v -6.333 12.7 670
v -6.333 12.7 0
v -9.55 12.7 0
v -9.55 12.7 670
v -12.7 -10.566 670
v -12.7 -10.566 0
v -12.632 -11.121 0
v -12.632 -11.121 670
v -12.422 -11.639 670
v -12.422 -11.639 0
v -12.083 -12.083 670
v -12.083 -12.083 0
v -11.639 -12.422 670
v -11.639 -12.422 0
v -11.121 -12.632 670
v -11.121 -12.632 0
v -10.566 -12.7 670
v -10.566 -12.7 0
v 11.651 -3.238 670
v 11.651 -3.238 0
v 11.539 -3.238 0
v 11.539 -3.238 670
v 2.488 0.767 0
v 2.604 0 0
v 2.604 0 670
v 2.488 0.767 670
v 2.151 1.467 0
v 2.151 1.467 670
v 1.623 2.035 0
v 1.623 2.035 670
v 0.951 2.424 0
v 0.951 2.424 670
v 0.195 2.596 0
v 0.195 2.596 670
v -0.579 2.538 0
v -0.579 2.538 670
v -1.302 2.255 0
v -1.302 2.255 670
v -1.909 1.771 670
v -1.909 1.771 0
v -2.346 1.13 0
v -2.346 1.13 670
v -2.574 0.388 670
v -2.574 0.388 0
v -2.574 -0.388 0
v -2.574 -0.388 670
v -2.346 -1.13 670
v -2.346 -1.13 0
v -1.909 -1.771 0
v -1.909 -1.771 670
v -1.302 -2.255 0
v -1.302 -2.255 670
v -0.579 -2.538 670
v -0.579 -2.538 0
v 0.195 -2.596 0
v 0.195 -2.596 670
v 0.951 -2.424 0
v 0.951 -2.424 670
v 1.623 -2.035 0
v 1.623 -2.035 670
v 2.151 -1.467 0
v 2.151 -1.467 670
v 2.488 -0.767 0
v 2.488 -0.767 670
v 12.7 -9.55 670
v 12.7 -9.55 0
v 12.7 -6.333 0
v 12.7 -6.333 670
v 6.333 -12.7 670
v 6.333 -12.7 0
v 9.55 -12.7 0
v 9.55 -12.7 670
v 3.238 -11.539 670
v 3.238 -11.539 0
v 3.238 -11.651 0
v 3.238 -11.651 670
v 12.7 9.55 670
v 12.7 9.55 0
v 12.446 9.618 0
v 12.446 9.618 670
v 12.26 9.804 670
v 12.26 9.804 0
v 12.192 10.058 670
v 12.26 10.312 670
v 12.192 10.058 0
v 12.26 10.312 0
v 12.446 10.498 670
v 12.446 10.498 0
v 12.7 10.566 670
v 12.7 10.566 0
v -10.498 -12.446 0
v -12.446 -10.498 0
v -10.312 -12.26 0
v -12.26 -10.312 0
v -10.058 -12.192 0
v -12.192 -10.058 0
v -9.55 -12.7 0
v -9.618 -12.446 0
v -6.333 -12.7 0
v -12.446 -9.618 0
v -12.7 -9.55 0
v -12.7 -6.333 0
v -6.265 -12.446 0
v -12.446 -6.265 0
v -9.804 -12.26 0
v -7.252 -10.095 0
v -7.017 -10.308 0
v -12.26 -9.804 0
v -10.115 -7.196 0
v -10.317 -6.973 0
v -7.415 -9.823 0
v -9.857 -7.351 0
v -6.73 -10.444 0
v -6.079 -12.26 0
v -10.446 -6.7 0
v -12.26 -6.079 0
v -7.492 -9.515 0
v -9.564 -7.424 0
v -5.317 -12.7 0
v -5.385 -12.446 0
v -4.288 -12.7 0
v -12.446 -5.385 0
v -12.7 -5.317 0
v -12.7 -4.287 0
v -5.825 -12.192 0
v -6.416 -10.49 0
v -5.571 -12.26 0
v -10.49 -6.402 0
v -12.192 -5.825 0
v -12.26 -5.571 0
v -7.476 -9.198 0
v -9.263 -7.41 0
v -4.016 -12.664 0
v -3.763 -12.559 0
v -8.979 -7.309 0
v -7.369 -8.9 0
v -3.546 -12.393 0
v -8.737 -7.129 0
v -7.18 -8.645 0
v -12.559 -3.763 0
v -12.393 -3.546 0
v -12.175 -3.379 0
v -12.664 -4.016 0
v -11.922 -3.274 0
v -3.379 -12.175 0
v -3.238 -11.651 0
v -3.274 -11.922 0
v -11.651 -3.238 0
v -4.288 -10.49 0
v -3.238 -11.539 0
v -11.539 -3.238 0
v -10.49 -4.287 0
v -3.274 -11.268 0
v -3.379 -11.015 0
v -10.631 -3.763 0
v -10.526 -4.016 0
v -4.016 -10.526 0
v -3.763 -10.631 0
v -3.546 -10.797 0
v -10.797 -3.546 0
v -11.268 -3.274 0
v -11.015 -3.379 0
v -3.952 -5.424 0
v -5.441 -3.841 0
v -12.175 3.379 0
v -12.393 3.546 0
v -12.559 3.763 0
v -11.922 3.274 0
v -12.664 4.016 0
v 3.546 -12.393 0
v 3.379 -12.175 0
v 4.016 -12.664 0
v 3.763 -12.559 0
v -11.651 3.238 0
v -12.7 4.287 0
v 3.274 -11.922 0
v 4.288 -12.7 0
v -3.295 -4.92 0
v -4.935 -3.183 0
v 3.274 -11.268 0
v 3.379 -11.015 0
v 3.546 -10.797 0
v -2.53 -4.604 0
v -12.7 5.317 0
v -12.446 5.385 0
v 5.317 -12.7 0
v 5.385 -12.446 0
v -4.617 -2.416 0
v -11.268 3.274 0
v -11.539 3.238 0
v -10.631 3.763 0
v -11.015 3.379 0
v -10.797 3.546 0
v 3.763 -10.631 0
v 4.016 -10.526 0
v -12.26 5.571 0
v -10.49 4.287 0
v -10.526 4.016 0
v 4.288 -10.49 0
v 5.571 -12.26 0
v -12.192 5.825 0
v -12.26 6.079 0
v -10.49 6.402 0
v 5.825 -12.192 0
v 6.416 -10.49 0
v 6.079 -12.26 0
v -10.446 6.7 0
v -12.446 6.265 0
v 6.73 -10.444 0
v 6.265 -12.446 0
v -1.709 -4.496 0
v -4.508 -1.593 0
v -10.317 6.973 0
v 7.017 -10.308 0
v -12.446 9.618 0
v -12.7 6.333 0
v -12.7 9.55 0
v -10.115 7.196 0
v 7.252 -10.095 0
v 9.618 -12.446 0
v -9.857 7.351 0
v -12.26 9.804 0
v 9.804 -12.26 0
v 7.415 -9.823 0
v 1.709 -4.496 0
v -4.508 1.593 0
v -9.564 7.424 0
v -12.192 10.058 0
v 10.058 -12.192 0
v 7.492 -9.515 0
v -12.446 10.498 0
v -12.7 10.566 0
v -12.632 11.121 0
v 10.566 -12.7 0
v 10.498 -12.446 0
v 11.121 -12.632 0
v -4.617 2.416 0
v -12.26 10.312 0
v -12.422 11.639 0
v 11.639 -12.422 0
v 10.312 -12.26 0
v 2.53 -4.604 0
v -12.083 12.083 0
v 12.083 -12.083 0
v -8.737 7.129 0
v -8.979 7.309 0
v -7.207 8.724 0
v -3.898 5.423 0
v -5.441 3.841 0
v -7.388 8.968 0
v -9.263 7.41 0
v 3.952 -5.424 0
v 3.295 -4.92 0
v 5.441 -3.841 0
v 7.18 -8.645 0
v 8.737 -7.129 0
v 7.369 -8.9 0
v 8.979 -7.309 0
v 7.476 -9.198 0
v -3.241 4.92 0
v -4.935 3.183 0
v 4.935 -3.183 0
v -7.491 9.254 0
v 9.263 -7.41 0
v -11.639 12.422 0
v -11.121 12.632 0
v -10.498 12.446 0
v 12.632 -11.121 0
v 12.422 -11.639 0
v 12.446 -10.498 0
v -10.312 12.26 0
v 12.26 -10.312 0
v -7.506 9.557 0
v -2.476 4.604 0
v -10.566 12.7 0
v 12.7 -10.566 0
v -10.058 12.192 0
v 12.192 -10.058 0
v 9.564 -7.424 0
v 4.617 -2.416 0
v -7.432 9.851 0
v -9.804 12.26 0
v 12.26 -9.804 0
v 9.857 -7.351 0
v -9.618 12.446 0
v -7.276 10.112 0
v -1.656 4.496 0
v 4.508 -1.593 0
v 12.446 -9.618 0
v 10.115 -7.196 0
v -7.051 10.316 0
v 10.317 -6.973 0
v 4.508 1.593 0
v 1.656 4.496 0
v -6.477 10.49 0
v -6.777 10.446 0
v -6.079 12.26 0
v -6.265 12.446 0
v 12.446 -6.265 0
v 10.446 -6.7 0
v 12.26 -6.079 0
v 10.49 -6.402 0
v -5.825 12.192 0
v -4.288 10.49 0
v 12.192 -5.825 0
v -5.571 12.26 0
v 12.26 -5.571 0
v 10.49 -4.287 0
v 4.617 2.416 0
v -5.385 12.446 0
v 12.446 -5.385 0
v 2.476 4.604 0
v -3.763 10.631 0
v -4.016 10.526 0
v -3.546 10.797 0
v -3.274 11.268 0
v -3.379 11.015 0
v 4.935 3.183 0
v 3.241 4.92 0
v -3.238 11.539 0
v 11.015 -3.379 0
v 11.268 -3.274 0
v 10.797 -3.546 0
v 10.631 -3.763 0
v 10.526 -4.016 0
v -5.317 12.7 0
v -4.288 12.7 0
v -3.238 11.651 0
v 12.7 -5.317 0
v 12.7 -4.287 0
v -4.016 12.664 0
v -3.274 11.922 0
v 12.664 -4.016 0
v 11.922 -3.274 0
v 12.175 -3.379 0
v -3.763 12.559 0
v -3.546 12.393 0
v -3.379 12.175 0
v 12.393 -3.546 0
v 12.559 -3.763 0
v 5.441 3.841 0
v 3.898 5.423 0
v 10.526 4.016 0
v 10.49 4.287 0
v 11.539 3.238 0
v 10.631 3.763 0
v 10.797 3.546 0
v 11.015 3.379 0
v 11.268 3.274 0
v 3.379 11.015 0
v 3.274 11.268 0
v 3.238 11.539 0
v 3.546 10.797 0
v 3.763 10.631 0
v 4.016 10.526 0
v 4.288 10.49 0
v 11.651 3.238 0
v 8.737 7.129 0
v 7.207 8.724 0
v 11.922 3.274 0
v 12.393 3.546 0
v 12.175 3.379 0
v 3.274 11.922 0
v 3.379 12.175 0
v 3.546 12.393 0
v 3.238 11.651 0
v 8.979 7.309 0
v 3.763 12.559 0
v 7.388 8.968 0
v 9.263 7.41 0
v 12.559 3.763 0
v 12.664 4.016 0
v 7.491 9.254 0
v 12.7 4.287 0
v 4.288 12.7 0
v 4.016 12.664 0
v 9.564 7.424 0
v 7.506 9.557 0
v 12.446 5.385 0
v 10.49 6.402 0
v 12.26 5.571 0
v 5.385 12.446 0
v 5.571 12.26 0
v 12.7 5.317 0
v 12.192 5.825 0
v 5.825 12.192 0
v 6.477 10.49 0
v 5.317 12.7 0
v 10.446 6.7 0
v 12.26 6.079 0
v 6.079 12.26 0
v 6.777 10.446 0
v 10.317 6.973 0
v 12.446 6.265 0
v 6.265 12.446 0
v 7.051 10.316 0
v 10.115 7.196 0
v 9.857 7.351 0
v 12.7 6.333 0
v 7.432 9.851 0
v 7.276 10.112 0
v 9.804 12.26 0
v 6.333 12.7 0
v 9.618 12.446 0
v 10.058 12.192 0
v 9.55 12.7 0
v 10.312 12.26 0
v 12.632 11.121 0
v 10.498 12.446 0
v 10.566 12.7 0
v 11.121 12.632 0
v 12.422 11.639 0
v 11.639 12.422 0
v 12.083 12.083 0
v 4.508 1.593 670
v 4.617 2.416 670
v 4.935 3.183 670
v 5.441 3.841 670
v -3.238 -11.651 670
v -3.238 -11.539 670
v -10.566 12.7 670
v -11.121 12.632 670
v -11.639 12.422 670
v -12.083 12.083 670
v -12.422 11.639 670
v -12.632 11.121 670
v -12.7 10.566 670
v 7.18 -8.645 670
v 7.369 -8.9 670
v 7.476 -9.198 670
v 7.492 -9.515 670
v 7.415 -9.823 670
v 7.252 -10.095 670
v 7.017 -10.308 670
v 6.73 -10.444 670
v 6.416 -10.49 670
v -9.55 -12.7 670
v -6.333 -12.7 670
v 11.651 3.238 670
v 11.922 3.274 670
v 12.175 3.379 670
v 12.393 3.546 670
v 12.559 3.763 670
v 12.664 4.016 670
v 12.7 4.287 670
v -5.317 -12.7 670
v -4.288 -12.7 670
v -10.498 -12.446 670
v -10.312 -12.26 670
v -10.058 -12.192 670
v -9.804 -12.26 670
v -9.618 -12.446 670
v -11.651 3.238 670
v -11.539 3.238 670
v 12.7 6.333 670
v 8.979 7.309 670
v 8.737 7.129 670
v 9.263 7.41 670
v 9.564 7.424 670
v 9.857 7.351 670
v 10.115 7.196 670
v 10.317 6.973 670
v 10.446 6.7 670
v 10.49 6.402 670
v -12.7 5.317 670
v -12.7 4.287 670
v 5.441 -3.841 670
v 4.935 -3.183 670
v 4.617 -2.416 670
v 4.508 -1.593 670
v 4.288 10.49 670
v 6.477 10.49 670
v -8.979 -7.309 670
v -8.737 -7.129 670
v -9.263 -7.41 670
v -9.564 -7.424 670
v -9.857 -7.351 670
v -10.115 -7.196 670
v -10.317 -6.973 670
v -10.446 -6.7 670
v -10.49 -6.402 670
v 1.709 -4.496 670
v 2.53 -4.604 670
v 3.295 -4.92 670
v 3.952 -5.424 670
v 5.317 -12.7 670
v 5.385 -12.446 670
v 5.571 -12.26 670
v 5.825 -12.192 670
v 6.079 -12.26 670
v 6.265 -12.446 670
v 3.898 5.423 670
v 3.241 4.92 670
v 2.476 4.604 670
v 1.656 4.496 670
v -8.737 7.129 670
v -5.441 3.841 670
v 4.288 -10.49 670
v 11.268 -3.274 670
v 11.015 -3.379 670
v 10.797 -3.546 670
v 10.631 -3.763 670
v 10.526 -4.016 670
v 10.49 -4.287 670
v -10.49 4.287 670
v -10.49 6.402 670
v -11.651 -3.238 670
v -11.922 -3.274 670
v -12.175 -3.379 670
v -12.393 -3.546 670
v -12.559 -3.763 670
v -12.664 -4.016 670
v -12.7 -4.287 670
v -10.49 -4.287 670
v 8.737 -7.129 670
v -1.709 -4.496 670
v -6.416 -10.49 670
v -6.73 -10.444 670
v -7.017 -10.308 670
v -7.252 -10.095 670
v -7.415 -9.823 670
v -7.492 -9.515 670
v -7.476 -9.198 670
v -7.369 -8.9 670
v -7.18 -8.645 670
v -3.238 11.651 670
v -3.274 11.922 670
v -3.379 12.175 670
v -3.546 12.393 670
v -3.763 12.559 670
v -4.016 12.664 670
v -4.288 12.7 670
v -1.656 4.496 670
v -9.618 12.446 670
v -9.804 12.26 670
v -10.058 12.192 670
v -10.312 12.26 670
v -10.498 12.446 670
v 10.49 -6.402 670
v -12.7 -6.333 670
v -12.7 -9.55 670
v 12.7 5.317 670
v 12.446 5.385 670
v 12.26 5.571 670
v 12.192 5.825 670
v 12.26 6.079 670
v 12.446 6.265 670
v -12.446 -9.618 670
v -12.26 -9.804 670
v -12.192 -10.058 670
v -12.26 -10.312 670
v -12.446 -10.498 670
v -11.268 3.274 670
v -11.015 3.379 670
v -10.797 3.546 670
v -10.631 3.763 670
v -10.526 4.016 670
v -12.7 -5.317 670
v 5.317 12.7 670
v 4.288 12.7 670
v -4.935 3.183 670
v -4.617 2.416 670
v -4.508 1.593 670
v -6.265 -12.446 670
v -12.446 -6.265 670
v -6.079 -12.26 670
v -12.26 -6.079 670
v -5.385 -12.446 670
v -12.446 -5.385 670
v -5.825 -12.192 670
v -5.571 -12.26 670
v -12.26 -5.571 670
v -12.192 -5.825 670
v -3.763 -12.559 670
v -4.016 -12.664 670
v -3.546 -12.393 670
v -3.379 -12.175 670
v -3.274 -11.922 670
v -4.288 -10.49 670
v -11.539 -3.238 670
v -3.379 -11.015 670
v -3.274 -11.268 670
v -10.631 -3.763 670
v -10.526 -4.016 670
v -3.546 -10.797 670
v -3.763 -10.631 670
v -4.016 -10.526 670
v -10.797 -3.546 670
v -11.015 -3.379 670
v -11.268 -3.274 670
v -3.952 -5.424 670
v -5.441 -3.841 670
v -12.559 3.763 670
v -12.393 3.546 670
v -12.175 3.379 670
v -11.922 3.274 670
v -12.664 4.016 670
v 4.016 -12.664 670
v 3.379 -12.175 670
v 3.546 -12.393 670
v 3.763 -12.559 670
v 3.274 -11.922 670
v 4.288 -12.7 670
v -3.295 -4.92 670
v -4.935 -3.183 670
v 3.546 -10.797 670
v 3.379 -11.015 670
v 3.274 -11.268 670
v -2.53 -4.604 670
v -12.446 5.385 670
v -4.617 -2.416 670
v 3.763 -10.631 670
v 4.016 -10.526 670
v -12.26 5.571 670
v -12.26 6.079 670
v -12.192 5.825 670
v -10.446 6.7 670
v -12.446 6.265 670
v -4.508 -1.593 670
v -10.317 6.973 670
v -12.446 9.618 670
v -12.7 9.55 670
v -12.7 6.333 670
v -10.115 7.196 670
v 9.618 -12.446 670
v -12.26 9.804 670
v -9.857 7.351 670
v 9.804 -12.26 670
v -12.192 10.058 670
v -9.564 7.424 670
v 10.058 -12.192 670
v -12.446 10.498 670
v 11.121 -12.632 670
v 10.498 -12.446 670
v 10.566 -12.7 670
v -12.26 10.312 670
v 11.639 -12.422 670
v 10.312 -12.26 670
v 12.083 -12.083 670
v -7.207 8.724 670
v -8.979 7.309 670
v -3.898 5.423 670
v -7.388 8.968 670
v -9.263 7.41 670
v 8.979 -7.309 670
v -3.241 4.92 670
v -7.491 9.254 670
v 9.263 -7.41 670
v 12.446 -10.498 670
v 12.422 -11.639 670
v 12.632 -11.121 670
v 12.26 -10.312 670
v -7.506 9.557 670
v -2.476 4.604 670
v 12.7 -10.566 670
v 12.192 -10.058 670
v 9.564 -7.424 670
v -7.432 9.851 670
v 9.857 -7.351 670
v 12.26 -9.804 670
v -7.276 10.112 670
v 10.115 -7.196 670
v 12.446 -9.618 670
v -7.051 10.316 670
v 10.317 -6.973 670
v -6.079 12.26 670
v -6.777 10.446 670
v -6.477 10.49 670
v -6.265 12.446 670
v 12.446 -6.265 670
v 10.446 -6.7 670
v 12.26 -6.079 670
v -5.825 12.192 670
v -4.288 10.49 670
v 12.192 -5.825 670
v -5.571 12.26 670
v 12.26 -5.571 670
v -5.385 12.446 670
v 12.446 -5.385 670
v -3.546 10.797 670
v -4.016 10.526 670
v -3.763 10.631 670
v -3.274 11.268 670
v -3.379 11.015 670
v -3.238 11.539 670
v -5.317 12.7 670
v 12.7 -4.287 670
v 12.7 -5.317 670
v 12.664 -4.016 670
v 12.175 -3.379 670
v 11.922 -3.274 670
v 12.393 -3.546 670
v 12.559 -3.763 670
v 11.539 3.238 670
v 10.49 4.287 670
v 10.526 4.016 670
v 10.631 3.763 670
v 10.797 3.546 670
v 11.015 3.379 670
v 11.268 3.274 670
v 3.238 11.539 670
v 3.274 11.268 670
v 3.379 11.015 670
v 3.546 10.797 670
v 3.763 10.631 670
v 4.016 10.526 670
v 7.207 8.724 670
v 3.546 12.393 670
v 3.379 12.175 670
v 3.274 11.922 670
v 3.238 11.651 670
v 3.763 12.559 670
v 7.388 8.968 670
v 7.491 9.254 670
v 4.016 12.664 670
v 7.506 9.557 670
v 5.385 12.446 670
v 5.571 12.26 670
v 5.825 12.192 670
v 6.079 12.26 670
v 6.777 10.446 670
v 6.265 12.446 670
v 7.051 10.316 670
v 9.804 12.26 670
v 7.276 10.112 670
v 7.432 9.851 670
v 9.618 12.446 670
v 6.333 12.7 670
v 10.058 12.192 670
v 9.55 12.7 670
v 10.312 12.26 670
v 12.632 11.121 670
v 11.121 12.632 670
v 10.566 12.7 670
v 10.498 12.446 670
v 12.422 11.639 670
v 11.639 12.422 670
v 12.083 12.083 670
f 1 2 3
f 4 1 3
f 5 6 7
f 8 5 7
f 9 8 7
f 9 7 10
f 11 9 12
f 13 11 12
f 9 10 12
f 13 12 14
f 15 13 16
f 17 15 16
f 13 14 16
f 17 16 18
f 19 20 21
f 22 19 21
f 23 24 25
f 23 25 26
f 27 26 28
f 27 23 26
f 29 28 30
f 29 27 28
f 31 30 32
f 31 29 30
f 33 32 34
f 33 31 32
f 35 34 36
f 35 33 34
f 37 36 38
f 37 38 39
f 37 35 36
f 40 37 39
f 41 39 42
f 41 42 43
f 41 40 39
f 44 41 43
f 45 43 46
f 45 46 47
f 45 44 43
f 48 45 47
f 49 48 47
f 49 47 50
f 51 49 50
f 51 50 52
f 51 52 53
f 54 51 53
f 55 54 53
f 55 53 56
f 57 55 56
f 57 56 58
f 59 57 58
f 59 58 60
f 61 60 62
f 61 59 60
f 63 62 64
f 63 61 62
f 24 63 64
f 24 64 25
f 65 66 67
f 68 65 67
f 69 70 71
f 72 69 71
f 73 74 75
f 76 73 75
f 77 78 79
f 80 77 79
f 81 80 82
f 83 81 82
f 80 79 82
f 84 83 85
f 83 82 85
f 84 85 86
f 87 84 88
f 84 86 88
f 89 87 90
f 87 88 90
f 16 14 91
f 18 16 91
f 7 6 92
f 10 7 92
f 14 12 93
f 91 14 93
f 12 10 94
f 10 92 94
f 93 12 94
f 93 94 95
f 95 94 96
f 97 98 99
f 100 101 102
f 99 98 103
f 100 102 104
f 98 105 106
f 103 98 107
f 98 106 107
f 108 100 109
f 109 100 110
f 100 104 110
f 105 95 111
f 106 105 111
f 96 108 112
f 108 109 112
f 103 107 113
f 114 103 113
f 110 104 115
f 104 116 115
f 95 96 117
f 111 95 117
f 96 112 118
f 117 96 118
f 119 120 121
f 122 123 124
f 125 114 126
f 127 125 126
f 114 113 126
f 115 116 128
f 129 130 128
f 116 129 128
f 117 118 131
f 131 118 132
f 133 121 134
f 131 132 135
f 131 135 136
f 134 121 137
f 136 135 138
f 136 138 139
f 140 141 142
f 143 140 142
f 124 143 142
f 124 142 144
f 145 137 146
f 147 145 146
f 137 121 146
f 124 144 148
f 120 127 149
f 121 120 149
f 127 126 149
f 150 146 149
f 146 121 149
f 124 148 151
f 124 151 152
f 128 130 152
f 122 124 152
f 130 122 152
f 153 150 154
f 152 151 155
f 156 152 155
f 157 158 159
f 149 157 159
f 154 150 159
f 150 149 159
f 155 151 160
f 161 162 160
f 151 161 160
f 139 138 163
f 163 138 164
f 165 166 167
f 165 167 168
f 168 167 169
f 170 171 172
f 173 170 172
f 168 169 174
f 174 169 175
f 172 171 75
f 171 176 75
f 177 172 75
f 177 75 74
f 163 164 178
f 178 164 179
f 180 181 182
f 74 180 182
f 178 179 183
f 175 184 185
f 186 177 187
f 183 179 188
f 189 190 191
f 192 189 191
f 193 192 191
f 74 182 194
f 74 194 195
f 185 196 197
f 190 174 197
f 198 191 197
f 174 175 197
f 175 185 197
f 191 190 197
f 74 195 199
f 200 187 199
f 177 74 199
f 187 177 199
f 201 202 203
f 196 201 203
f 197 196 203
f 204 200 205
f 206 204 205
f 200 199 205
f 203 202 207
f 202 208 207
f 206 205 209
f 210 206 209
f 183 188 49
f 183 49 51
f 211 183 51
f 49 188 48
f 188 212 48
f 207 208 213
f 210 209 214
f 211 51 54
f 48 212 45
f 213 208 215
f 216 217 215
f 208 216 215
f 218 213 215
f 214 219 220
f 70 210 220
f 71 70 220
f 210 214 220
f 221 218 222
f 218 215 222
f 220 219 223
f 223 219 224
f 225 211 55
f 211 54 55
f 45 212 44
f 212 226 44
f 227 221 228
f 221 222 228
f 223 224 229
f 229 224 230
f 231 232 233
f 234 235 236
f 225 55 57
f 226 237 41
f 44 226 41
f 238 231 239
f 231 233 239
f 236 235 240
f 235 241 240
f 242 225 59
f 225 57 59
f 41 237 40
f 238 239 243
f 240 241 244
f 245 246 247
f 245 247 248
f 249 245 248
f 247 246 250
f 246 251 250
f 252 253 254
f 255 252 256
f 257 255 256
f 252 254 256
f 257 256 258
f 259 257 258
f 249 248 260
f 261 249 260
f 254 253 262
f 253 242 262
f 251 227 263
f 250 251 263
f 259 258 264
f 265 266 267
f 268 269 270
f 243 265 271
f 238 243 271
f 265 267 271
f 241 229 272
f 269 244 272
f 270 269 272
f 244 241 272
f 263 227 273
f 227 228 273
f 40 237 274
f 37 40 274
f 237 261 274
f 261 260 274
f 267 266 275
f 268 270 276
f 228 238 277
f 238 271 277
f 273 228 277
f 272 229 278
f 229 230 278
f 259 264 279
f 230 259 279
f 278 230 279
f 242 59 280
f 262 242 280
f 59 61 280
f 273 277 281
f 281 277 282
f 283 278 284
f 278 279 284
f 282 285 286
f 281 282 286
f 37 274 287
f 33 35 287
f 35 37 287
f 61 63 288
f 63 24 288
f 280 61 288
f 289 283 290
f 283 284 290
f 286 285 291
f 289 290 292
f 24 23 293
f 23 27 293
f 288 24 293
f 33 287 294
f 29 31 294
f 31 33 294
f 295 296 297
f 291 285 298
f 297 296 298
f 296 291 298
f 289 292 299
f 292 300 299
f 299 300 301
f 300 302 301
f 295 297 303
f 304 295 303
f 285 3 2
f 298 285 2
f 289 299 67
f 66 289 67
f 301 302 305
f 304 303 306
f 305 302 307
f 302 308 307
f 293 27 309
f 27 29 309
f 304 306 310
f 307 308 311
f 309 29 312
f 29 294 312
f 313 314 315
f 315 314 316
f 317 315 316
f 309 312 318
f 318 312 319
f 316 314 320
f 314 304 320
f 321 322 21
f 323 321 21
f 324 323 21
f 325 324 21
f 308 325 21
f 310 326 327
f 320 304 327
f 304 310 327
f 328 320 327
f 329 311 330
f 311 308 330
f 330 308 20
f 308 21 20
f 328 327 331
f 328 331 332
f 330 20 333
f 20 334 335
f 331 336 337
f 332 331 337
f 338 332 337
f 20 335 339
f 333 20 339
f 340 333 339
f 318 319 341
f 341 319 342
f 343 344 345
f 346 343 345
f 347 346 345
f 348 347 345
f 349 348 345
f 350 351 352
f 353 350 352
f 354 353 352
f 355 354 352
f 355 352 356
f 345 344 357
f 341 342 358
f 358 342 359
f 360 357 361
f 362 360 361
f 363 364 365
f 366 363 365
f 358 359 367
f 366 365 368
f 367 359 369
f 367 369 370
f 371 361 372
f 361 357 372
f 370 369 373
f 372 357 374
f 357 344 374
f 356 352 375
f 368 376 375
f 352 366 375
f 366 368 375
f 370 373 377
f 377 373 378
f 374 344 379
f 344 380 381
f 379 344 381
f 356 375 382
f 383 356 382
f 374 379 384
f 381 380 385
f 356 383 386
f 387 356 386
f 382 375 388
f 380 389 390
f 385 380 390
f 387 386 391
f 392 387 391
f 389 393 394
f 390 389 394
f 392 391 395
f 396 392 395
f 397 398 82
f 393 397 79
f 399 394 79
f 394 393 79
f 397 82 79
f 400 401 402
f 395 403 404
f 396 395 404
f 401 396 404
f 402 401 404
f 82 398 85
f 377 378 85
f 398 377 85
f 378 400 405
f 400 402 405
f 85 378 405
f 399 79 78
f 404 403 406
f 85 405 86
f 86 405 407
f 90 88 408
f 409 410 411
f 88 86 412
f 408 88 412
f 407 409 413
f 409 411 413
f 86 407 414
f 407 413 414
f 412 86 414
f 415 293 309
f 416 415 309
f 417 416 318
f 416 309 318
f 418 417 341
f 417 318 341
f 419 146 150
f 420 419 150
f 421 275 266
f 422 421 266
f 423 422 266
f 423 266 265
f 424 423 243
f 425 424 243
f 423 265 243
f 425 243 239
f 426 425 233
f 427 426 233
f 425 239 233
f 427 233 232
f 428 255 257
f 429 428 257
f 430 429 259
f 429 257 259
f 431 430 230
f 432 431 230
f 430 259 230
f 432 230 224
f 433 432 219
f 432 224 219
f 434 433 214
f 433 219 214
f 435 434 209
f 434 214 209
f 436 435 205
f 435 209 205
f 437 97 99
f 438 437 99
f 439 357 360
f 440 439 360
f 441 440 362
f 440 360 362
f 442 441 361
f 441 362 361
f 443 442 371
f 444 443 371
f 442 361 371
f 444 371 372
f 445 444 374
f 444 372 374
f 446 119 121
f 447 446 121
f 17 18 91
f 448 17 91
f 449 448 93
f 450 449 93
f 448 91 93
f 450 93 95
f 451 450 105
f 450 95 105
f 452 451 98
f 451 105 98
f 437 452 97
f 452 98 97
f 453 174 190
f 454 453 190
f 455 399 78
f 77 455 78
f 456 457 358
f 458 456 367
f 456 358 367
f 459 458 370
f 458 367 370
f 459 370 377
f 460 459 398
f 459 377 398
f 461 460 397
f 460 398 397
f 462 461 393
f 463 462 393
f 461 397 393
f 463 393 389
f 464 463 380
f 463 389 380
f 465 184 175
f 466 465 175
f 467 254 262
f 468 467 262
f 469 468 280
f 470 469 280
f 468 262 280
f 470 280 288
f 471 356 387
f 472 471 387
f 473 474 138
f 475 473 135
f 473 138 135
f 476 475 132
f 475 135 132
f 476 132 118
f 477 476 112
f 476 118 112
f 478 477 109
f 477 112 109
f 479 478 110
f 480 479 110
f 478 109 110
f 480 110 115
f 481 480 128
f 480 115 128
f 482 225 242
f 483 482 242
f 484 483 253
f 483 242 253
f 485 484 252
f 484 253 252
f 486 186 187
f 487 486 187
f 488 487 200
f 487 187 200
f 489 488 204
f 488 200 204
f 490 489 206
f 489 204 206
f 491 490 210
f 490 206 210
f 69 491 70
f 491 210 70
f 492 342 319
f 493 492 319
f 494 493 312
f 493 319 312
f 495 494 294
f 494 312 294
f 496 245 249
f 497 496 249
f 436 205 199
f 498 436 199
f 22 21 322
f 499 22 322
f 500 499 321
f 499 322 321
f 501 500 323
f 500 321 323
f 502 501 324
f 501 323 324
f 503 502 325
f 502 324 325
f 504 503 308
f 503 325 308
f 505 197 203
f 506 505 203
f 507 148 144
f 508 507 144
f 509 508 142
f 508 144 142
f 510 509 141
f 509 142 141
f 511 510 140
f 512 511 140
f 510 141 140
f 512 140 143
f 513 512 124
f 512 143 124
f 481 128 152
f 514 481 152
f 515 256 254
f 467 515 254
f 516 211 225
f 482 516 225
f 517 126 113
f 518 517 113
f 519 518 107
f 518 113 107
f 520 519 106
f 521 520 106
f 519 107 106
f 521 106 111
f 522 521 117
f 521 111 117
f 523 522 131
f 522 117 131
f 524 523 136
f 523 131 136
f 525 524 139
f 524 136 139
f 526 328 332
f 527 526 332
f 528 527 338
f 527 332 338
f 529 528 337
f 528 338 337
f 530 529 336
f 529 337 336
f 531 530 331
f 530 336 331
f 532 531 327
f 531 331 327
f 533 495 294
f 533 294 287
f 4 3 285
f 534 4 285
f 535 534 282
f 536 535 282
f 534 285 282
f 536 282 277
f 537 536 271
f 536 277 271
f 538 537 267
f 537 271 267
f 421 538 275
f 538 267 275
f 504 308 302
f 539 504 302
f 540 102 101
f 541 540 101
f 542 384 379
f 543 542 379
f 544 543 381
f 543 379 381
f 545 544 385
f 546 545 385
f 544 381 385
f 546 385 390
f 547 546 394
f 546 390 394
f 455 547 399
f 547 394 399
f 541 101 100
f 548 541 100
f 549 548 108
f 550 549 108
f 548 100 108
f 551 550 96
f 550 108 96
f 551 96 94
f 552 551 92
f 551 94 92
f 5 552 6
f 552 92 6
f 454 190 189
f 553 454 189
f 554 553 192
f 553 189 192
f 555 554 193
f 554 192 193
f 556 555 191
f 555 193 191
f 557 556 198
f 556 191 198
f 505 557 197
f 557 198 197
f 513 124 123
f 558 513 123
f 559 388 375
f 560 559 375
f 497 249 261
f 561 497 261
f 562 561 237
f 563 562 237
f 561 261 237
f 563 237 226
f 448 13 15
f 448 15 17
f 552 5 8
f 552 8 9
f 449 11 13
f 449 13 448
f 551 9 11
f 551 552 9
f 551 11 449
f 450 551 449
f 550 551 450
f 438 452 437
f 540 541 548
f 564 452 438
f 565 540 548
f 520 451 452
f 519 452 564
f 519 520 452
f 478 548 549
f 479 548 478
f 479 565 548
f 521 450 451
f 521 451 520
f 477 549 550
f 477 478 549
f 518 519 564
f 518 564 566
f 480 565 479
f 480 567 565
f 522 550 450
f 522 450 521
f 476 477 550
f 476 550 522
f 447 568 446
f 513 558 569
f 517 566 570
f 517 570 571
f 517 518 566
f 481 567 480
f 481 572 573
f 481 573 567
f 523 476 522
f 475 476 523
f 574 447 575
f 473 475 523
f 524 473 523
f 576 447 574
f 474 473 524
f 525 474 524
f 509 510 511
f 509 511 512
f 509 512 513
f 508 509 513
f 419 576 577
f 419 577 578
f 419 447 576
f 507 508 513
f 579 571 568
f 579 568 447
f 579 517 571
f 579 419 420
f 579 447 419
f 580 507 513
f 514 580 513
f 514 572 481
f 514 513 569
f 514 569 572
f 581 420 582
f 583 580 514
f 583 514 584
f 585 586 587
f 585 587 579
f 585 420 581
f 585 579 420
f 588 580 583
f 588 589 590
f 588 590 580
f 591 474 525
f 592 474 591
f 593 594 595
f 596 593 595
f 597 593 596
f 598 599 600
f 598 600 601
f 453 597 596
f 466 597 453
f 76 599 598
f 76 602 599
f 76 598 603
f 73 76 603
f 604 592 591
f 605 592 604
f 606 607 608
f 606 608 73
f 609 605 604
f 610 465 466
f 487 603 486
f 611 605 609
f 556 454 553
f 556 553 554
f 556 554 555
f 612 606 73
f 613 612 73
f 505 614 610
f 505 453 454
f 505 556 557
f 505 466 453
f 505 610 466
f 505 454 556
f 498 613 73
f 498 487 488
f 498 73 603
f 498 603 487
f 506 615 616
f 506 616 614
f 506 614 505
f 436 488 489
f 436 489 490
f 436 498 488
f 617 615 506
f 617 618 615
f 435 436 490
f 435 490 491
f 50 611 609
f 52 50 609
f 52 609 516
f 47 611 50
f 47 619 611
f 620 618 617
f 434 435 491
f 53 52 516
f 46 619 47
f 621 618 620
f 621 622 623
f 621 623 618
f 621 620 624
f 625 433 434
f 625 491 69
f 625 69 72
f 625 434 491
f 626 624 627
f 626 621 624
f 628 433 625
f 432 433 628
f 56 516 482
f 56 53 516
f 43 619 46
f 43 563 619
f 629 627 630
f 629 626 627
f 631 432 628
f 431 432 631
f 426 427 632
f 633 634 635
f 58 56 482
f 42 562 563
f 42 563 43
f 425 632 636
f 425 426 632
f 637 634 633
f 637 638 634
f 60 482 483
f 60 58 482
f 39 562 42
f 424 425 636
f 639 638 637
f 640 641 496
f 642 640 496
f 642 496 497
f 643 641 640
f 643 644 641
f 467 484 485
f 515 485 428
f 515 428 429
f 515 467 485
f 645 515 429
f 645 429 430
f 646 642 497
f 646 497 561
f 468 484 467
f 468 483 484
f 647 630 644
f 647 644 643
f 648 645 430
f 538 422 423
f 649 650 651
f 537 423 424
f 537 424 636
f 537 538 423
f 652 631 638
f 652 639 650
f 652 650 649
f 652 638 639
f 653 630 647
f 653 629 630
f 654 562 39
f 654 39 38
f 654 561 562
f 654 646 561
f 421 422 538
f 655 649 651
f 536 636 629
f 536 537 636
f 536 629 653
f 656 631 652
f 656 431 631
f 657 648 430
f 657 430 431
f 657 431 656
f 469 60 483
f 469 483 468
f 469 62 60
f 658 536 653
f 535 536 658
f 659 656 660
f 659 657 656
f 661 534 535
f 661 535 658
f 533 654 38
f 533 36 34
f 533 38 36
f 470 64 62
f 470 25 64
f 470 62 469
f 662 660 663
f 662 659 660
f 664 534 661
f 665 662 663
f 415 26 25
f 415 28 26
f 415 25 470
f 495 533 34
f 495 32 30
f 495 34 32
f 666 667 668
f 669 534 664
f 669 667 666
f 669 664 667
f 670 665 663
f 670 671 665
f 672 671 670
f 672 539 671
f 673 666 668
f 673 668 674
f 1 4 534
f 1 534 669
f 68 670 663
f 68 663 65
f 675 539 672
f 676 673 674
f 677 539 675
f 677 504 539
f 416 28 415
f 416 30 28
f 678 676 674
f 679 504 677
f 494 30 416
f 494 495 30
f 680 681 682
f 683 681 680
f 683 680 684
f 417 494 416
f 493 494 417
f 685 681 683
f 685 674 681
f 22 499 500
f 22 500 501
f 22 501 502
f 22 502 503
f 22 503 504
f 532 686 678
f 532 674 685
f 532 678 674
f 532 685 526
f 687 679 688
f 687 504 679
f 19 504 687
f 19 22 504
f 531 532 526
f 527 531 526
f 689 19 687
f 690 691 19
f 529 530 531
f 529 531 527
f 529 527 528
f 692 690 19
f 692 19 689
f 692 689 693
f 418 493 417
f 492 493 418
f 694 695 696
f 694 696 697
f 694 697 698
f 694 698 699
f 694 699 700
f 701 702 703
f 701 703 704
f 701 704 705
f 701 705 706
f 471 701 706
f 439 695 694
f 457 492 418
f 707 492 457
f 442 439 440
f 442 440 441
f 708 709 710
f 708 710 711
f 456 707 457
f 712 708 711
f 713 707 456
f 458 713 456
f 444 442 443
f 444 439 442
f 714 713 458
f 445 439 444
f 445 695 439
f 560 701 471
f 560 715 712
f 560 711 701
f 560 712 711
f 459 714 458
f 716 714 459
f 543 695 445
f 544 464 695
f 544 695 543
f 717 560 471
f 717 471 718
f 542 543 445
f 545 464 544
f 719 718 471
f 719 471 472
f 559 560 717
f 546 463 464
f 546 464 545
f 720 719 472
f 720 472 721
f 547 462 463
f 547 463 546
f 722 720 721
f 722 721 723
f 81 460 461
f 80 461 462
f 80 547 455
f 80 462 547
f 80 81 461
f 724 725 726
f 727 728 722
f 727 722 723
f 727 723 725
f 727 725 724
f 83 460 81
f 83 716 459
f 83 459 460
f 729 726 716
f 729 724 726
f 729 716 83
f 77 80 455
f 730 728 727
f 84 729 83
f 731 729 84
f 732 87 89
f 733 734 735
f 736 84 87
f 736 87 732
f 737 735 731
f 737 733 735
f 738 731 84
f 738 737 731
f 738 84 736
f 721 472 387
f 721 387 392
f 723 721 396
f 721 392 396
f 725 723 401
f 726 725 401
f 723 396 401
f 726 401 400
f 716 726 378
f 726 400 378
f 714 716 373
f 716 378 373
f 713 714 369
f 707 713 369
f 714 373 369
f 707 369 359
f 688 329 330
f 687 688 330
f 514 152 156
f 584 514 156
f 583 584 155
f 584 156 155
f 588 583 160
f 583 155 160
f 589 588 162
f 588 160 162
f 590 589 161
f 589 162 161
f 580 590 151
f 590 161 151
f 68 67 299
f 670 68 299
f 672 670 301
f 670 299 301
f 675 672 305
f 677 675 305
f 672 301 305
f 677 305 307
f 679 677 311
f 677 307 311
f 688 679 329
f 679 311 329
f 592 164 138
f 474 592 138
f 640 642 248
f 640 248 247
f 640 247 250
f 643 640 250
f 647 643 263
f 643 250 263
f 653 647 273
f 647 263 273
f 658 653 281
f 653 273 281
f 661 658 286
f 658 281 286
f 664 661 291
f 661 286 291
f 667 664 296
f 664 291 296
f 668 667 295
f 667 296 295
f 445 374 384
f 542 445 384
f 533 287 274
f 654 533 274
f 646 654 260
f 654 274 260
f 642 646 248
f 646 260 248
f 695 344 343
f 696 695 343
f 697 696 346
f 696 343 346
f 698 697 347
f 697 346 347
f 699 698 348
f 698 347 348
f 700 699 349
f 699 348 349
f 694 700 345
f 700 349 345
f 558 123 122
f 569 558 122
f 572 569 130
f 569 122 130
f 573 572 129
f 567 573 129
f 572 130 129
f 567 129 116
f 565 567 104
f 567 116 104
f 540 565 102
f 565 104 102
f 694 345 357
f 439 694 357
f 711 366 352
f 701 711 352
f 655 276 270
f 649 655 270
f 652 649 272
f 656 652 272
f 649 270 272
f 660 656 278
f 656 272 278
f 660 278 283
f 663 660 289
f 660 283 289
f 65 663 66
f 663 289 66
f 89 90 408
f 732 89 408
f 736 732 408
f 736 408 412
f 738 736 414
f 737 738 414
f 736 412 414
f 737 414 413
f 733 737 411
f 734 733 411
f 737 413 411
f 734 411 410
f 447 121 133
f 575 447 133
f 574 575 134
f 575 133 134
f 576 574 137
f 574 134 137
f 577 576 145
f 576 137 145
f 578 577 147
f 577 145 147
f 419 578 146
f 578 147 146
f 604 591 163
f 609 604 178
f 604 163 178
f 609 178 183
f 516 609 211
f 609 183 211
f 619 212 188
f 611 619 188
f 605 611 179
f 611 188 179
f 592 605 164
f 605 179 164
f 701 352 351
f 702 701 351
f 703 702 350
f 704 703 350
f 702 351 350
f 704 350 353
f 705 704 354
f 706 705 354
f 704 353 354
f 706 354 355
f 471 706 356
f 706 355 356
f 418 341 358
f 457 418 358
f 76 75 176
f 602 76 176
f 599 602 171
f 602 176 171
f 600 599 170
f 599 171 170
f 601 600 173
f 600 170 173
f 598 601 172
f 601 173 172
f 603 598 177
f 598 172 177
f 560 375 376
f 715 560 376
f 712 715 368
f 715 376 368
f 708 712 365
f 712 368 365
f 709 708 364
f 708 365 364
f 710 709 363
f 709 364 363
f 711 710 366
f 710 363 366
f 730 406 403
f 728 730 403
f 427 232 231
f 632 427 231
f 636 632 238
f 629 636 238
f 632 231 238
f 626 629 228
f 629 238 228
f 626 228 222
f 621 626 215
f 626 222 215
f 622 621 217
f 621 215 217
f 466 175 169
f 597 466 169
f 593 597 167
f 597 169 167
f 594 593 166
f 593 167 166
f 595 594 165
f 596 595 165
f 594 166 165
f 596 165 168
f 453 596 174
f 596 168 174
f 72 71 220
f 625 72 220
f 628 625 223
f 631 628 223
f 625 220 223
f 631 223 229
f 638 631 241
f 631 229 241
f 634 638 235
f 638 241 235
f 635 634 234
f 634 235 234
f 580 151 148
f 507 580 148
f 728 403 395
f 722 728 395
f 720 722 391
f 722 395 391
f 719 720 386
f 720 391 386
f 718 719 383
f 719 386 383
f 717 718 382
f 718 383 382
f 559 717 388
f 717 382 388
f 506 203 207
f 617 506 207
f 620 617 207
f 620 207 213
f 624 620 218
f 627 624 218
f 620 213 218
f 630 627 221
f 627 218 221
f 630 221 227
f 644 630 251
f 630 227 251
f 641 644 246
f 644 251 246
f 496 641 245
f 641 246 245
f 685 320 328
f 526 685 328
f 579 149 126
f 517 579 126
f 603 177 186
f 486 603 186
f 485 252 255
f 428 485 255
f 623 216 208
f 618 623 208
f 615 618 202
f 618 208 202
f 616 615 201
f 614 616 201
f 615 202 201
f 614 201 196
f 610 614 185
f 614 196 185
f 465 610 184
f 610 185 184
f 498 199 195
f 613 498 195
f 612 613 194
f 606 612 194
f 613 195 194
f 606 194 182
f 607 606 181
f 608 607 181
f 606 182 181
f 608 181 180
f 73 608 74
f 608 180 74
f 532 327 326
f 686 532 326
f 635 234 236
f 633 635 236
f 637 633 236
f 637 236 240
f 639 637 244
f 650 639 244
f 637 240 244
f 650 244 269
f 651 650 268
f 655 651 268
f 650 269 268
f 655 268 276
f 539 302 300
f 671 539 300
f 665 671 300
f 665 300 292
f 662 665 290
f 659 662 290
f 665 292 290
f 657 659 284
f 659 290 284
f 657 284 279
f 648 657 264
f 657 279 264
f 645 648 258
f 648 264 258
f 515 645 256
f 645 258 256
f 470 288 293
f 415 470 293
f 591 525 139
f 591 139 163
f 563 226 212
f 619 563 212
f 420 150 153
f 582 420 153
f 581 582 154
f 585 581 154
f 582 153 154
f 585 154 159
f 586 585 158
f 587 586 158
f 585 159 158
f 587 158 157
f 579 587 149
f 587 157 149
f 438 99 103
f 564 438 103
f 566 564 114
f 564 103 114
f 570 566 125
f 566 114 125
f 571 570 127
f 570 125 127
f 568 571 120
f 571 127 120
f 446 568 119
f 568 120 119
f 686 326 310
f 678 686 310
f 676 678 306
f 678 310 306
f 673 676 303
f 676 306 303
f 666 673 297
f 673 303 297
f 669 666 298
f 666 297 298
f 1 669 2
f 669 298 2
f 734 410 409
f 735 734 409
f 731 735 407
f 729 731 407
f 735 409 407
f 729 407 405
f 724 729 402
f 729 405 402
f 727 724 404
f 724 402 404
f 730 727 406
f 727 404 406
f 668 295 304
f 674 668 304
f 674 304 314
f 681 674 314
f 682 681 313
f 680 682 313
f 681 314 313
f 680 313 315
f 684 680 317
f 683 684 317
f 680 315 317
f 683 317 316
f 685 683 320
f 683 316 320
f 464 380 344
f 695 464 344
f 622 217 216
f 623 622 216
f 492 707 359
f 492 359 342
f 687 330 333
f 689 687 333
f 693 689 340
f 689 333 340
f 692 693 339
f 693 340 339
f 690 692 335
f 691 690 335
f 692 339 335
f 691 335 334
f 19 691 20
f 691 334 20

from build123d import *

# Parameters (mm, degrees)
SKETCH1_R           = 2.6035
BOSS_EXTRUDE1_DEPTH = 670


with BuildPart() as part:
    # Sketch1 → Boss-Extrude1 (new body)
    with BuildSketch(Plane.XY):
        with BuildLine():
            Line((-7.179650497, -8.645192506), (-3.952270251, -5.423690499))
            ThreePointArc((-3.952270251, -5.423690499), (-2.922936451, -4.736929036), (-1.709253557, -4.4958))
            Line((-1.709253557, -4.4958), (1.709253557, -4.4958))
            ThreePointArc((1.709253557, -4.4958), (2.922936451, -4.736929036), (3.952270251, -5.423690499))
            Line((3.952270251, -5.423690499), (7.179650497, -8.645192506))
            ThreePointArc((7.179650497, -8.645192506), (7.41473083, -9.822813117), (6.416408329, -10.4902))
            Line((6.416408329, -10.4902), (4.287512407, -10.4902))
            ThreePointArc((4.287512407, -10.4902), (3.54574862, -10.79744862), (3.2385, -11.539212407))
            Line((3.2385, -11.539212407), (3.2385, -11.650987593))
            ThreePointArc((3.2385, -11.650987593), (3.54574862, -12.39275138), (4.287512407, -12.7))
            Line((4.287512407, -12.7), (5.317126718, -12.7))
            ThreePointArc((5.317126718, -12.7), (5.825126718, -12.192), (6.333126718, -12.7))
            Line((6.333126718, -12.7), (9.550443118, -12.7))
            ThreePointArc((9.550443118, -12.7), (10.058366869, -12.192000006), (10.566443095, -12.699847501))
            ThreePointArc((10.566443095, -12.699847501), (12.082537762, -12.08250727), (12.699846982, -10.566399977))
            ThreePointArc((12.699846982, -10.566399977), (12.192000006, -10.058323491), (12.7, -9.5504))
            Line((12.7, -9.5504), (12.7, -6.3330836))
            ThreePointArc((12.7, -6.3330836), (12.192, -5.8250836), (12.7, -5.3170836))
            Line((12.7, -5.3170836), (12.7, -4.287469289))
            ThreePointArc((12.7, -4.287469289), (12.39275138, -3.545705502), (11.650987593, -3.238456882))
            Line((11.650987593, -3.238456882), (11.539212407, -3.238456882))
            ThreePointArc((11.539212407, -3.238456882), (10.79744862, -3.545705502), (10.4902, -4.287469289))
            Line((10.4902, -4.287469289), (10.4902, -6.402089023))
            ThreePointArc((10.4902, -6.402089023), (9.856505071, -7.351067942), (8.737131347, -7.129408934))
            Line((8.737131347, -7.129408934), (5.441005833, -3.840816462))
            ThreePointArc((5.441005833, -3.840816462), (4.750877967, -2.809883091), (4.5085, -1.593185507))
            Line((4.5085, -1.593185507), (4.5085, 1.593185507))
            ThreePointArc((4.5085, 1.593185507), (4.750877967, 2.809883091), (5.441005833, 3.840816462))
            Line((5.441005833, 3.840816462), (8.737131347, 7.129408934))
            ThreePointArc((8.737131347, 7.129408934), (9.856505071, 7.351067942), (10.4902, 6.402089023))
            Line((10.4902, 6.402089023), (10.4902, 4.287469289))
            ThreePointArc((10.4902, 4.287469289), (10.79744862, 3.545705502), (11.539212407, 3.238456882))
            Line((11.539212407, 3.238456882), (11.650987593, 3.238456882))
            ThreePointArc((11.650987593, 3.238456882), (12.39275138, 3.545705502), (12.7, 4.287469289))
            Line((12.7, 4.287469289), (12.7, 5.3170836))
            ThreePointArc((12.7, 5.3170836), (12.192, 5.8250836), (12.7, 6.3330836))
            Line((12.7, 6.3330836), (12.7, 9.5504))
            ThreePointArc((12.7, 9.5504), (12.192000006, 10.058323491), (12.699846982, 10.566399977))
            ThreePointArc((12.699846982, 10.566399977), (12.082537762, 12.08250727), (10.566443095, 12.699847501))
            ThreePointArc((10.566443095, 12.699847501), (10.058366869, 12.192000006), (9.550443118, 12.7))
            Line((9.550443118, 12.7), (6.333126718, 12.7))
            ThreePointArc((6.333126718, 12.7), (5.825126718, 12.192), (5.317126718, 12.7))
            Line((5.317126718, 12.7), (4.287512407, 12.7))
            ThreePointArc((4.287512407, 12.7), (3.54574862, 12.39275138), (3.2385, 11.650987593))
            Line((3.2385, 11.650987593), (3.2385, 11.539212407))
            ThreePointArc((3.2385, 11.539212407), (3.54574862, 10.79744862), (4.287512407, 10.4902))
            Line((4.287512407, 10.4902), (6.476788598, 10.4902))
            ThreePointArc((6.476788598, 10.4902), (7.432222385, 9.85140422), (7.207036008, 8.724370562))
            Line((7.207036008, 8.724370562), (3.898272566, 5.423169045))
            ThreePointArc((3.898272566, 5.423169045), (2.869120213, 4.736787962), (1.655778399, 4.4958))
            Line((1.655778399, 4.4958), (-1.655778399, 4.4958))
            ThreePointArc((-1.655778399, 4.4958), (-2.869120213, 4.736787962), (-3.898272566, 5.423169045))
            Line((-3.898272566, 5.423169045), (-7.207036008, 8.724370562))
            ThreePointArc((-7.207036008, 8.724370562), (-7.432222385, 9.85140422), (-6.476788598, 10.4902))
            Line((-6.476788598, 10.4902), (-4.287512407, 10.4902))
            ThreePointArc((-4.287512407, 10.4902), (-3.54574862, 10.79744862), (-3.2385, 11.539212407))
            Line((-3.2385, 11.539212407), (-3.2385, 11.650987593))
            ThreePointArc((-3.2385, 11.650987593), (-3.54574862, 12.39275138), (-4.287512407, 12.7))
            Line((-4.287512407, 12.7), (-5.317126718, 12.7))
            ThreePointArc((-5.317126718, 12.7), (-5.825126718, 12.192), (-6.333126718, 12.7))
            Line((-6.333126718, 12.7), (-9.550443118, 12.7))
            ThreePointArc((-9.550443118, 12.7), (-10.058366869, 12.192000006), (-10.566443095, 12.699847501))
            ThreePointArc((-10.566443095, 12.699847501), (-12.082537762, 12.08250727), (-12.699846982, 10.566399977))
            ThreePointArc((-12.699846982, 10.566399977), (-12.192000006, 10.058323491), (-12.7, 9.5504))
            Line((-12.7, 9.5504), (-12.7, 6.3330836))
            ThreePointArc((-12.7, 6.3330836), (-12.192, 5.8250836), (-12.7, 5.3170836))
            Line((-12.7, 5.3170836), (-12.7, 4.287469289))
            ThreePointArc((-12.7, 4.287469289), (-12.39275138, 3.545705502), (-11.650987593, 3.238456882))
            Line((-11.650987593, 3.238456882), (-11.539212407, 3.238456882))
            ThreePointArc((-11.539212407, 3.238456882), (-10.79744862, 3.545705502), (-10.4902, 4.287469289))
            Line((-10.4902, 4.287469289), (-10.4902, 6.402089023))
            ThreePointArc((-10.4902, 6.402089023), (-9.856505071, 7.351067942), (-8.737131347, 7.129408934))
            Line((-8.737131347, 7.129408934), (-5.441005833, 3.840816462))
            ThreePointArc((-5.441005833, 3.840816462), (-4.750877967, 2.809883091), (-4.5085, 1.593185507))
            Line((-4.5085, 1.593185507), (-4.5085, -1.593185507))
            ThreePointArc((-4.5085, -1.593185507), (-4.750877967, -2.809883091), (-5.441005833, -3.840816462))
            Line((-5.441005833, -3.840816462), (-8.737131347, -7.129408934))
            ThreePointArc((-8.737131347, -7.129408934), (-9.856505071, -7.351067942), (-10.4902, -6.402089023))
            Line((-10.4902, -6.402089023), (-10.4902, -4.287469289))
            ThreePointArc((-10.4902, -4.287469289), (-10.79744862, -3.545705502), (-11.539212407, -3.238456882))
            Line((-11.539212407, -3.238456882), (-11.650987593, -3.238456882))
            ThreePointArc((-11.650987593, -3.238456882), (-12.39275138, -3.545705502), (-12.7, -4.287469289))
            Line((-12.7, -4.287469289), (-12.7, -5.3170836))
            ThreePointArc((-12.7, -5.3170836), (-12.192, -5.8250836), (-12.7, -6.3330836))
            Line((-12.7, -6.3330836), (-12.7, -9.5504))
            ThreePointArc((-12.7, -9.5504), (-12.192000006, -10.058323491), (-12.699846982, -10.566399977))
            ThreePointArc((-12.699846982, -10.566399977), (-12.082537762, -12.08250727), (-10.566443095, -12.699847501))
            ThreePointArc((-10.566443095, -12.699847501), (-10.058366869, -12.192000006), (-9.550443118, -12.7))
            Line((-9.550443118, -12.7), (-6.333126718, -12.7))
            ThreePointArc((-6.333126718, -12.7), (-5.825126718, -12.192), (-5.317126718, -12.7))
            Line((-5.317126718, -12.7), (-4.287512407, -12.7))
            ThreePointArc((-4.287512407, -12.7), (-3.54574862, -12.39275138), (-3.2385, -11.650987593))
            Line((-3.2385, -11.650987593), (-3.2385, -11.539212407))
            ThreePointArc((-3.2385, -11.539212407), (-3.54574862, -10.79744862), (-4.287512407, -10.4902))
            Line((-4.287512407, -10.4902), (-6.416408329, -10.4902))
            ThreePointArc((-6.416408329, -10.4902), (-7.41473083, -9.822813117), (-7.179650497, -8.645192506))
        make_face()
        Circle(SKETCH1_R, mode=Mode.SUBTRACT)
    extrude(amount=BOSS_EXTRUDE1_DEPTH)


solid = part.part
